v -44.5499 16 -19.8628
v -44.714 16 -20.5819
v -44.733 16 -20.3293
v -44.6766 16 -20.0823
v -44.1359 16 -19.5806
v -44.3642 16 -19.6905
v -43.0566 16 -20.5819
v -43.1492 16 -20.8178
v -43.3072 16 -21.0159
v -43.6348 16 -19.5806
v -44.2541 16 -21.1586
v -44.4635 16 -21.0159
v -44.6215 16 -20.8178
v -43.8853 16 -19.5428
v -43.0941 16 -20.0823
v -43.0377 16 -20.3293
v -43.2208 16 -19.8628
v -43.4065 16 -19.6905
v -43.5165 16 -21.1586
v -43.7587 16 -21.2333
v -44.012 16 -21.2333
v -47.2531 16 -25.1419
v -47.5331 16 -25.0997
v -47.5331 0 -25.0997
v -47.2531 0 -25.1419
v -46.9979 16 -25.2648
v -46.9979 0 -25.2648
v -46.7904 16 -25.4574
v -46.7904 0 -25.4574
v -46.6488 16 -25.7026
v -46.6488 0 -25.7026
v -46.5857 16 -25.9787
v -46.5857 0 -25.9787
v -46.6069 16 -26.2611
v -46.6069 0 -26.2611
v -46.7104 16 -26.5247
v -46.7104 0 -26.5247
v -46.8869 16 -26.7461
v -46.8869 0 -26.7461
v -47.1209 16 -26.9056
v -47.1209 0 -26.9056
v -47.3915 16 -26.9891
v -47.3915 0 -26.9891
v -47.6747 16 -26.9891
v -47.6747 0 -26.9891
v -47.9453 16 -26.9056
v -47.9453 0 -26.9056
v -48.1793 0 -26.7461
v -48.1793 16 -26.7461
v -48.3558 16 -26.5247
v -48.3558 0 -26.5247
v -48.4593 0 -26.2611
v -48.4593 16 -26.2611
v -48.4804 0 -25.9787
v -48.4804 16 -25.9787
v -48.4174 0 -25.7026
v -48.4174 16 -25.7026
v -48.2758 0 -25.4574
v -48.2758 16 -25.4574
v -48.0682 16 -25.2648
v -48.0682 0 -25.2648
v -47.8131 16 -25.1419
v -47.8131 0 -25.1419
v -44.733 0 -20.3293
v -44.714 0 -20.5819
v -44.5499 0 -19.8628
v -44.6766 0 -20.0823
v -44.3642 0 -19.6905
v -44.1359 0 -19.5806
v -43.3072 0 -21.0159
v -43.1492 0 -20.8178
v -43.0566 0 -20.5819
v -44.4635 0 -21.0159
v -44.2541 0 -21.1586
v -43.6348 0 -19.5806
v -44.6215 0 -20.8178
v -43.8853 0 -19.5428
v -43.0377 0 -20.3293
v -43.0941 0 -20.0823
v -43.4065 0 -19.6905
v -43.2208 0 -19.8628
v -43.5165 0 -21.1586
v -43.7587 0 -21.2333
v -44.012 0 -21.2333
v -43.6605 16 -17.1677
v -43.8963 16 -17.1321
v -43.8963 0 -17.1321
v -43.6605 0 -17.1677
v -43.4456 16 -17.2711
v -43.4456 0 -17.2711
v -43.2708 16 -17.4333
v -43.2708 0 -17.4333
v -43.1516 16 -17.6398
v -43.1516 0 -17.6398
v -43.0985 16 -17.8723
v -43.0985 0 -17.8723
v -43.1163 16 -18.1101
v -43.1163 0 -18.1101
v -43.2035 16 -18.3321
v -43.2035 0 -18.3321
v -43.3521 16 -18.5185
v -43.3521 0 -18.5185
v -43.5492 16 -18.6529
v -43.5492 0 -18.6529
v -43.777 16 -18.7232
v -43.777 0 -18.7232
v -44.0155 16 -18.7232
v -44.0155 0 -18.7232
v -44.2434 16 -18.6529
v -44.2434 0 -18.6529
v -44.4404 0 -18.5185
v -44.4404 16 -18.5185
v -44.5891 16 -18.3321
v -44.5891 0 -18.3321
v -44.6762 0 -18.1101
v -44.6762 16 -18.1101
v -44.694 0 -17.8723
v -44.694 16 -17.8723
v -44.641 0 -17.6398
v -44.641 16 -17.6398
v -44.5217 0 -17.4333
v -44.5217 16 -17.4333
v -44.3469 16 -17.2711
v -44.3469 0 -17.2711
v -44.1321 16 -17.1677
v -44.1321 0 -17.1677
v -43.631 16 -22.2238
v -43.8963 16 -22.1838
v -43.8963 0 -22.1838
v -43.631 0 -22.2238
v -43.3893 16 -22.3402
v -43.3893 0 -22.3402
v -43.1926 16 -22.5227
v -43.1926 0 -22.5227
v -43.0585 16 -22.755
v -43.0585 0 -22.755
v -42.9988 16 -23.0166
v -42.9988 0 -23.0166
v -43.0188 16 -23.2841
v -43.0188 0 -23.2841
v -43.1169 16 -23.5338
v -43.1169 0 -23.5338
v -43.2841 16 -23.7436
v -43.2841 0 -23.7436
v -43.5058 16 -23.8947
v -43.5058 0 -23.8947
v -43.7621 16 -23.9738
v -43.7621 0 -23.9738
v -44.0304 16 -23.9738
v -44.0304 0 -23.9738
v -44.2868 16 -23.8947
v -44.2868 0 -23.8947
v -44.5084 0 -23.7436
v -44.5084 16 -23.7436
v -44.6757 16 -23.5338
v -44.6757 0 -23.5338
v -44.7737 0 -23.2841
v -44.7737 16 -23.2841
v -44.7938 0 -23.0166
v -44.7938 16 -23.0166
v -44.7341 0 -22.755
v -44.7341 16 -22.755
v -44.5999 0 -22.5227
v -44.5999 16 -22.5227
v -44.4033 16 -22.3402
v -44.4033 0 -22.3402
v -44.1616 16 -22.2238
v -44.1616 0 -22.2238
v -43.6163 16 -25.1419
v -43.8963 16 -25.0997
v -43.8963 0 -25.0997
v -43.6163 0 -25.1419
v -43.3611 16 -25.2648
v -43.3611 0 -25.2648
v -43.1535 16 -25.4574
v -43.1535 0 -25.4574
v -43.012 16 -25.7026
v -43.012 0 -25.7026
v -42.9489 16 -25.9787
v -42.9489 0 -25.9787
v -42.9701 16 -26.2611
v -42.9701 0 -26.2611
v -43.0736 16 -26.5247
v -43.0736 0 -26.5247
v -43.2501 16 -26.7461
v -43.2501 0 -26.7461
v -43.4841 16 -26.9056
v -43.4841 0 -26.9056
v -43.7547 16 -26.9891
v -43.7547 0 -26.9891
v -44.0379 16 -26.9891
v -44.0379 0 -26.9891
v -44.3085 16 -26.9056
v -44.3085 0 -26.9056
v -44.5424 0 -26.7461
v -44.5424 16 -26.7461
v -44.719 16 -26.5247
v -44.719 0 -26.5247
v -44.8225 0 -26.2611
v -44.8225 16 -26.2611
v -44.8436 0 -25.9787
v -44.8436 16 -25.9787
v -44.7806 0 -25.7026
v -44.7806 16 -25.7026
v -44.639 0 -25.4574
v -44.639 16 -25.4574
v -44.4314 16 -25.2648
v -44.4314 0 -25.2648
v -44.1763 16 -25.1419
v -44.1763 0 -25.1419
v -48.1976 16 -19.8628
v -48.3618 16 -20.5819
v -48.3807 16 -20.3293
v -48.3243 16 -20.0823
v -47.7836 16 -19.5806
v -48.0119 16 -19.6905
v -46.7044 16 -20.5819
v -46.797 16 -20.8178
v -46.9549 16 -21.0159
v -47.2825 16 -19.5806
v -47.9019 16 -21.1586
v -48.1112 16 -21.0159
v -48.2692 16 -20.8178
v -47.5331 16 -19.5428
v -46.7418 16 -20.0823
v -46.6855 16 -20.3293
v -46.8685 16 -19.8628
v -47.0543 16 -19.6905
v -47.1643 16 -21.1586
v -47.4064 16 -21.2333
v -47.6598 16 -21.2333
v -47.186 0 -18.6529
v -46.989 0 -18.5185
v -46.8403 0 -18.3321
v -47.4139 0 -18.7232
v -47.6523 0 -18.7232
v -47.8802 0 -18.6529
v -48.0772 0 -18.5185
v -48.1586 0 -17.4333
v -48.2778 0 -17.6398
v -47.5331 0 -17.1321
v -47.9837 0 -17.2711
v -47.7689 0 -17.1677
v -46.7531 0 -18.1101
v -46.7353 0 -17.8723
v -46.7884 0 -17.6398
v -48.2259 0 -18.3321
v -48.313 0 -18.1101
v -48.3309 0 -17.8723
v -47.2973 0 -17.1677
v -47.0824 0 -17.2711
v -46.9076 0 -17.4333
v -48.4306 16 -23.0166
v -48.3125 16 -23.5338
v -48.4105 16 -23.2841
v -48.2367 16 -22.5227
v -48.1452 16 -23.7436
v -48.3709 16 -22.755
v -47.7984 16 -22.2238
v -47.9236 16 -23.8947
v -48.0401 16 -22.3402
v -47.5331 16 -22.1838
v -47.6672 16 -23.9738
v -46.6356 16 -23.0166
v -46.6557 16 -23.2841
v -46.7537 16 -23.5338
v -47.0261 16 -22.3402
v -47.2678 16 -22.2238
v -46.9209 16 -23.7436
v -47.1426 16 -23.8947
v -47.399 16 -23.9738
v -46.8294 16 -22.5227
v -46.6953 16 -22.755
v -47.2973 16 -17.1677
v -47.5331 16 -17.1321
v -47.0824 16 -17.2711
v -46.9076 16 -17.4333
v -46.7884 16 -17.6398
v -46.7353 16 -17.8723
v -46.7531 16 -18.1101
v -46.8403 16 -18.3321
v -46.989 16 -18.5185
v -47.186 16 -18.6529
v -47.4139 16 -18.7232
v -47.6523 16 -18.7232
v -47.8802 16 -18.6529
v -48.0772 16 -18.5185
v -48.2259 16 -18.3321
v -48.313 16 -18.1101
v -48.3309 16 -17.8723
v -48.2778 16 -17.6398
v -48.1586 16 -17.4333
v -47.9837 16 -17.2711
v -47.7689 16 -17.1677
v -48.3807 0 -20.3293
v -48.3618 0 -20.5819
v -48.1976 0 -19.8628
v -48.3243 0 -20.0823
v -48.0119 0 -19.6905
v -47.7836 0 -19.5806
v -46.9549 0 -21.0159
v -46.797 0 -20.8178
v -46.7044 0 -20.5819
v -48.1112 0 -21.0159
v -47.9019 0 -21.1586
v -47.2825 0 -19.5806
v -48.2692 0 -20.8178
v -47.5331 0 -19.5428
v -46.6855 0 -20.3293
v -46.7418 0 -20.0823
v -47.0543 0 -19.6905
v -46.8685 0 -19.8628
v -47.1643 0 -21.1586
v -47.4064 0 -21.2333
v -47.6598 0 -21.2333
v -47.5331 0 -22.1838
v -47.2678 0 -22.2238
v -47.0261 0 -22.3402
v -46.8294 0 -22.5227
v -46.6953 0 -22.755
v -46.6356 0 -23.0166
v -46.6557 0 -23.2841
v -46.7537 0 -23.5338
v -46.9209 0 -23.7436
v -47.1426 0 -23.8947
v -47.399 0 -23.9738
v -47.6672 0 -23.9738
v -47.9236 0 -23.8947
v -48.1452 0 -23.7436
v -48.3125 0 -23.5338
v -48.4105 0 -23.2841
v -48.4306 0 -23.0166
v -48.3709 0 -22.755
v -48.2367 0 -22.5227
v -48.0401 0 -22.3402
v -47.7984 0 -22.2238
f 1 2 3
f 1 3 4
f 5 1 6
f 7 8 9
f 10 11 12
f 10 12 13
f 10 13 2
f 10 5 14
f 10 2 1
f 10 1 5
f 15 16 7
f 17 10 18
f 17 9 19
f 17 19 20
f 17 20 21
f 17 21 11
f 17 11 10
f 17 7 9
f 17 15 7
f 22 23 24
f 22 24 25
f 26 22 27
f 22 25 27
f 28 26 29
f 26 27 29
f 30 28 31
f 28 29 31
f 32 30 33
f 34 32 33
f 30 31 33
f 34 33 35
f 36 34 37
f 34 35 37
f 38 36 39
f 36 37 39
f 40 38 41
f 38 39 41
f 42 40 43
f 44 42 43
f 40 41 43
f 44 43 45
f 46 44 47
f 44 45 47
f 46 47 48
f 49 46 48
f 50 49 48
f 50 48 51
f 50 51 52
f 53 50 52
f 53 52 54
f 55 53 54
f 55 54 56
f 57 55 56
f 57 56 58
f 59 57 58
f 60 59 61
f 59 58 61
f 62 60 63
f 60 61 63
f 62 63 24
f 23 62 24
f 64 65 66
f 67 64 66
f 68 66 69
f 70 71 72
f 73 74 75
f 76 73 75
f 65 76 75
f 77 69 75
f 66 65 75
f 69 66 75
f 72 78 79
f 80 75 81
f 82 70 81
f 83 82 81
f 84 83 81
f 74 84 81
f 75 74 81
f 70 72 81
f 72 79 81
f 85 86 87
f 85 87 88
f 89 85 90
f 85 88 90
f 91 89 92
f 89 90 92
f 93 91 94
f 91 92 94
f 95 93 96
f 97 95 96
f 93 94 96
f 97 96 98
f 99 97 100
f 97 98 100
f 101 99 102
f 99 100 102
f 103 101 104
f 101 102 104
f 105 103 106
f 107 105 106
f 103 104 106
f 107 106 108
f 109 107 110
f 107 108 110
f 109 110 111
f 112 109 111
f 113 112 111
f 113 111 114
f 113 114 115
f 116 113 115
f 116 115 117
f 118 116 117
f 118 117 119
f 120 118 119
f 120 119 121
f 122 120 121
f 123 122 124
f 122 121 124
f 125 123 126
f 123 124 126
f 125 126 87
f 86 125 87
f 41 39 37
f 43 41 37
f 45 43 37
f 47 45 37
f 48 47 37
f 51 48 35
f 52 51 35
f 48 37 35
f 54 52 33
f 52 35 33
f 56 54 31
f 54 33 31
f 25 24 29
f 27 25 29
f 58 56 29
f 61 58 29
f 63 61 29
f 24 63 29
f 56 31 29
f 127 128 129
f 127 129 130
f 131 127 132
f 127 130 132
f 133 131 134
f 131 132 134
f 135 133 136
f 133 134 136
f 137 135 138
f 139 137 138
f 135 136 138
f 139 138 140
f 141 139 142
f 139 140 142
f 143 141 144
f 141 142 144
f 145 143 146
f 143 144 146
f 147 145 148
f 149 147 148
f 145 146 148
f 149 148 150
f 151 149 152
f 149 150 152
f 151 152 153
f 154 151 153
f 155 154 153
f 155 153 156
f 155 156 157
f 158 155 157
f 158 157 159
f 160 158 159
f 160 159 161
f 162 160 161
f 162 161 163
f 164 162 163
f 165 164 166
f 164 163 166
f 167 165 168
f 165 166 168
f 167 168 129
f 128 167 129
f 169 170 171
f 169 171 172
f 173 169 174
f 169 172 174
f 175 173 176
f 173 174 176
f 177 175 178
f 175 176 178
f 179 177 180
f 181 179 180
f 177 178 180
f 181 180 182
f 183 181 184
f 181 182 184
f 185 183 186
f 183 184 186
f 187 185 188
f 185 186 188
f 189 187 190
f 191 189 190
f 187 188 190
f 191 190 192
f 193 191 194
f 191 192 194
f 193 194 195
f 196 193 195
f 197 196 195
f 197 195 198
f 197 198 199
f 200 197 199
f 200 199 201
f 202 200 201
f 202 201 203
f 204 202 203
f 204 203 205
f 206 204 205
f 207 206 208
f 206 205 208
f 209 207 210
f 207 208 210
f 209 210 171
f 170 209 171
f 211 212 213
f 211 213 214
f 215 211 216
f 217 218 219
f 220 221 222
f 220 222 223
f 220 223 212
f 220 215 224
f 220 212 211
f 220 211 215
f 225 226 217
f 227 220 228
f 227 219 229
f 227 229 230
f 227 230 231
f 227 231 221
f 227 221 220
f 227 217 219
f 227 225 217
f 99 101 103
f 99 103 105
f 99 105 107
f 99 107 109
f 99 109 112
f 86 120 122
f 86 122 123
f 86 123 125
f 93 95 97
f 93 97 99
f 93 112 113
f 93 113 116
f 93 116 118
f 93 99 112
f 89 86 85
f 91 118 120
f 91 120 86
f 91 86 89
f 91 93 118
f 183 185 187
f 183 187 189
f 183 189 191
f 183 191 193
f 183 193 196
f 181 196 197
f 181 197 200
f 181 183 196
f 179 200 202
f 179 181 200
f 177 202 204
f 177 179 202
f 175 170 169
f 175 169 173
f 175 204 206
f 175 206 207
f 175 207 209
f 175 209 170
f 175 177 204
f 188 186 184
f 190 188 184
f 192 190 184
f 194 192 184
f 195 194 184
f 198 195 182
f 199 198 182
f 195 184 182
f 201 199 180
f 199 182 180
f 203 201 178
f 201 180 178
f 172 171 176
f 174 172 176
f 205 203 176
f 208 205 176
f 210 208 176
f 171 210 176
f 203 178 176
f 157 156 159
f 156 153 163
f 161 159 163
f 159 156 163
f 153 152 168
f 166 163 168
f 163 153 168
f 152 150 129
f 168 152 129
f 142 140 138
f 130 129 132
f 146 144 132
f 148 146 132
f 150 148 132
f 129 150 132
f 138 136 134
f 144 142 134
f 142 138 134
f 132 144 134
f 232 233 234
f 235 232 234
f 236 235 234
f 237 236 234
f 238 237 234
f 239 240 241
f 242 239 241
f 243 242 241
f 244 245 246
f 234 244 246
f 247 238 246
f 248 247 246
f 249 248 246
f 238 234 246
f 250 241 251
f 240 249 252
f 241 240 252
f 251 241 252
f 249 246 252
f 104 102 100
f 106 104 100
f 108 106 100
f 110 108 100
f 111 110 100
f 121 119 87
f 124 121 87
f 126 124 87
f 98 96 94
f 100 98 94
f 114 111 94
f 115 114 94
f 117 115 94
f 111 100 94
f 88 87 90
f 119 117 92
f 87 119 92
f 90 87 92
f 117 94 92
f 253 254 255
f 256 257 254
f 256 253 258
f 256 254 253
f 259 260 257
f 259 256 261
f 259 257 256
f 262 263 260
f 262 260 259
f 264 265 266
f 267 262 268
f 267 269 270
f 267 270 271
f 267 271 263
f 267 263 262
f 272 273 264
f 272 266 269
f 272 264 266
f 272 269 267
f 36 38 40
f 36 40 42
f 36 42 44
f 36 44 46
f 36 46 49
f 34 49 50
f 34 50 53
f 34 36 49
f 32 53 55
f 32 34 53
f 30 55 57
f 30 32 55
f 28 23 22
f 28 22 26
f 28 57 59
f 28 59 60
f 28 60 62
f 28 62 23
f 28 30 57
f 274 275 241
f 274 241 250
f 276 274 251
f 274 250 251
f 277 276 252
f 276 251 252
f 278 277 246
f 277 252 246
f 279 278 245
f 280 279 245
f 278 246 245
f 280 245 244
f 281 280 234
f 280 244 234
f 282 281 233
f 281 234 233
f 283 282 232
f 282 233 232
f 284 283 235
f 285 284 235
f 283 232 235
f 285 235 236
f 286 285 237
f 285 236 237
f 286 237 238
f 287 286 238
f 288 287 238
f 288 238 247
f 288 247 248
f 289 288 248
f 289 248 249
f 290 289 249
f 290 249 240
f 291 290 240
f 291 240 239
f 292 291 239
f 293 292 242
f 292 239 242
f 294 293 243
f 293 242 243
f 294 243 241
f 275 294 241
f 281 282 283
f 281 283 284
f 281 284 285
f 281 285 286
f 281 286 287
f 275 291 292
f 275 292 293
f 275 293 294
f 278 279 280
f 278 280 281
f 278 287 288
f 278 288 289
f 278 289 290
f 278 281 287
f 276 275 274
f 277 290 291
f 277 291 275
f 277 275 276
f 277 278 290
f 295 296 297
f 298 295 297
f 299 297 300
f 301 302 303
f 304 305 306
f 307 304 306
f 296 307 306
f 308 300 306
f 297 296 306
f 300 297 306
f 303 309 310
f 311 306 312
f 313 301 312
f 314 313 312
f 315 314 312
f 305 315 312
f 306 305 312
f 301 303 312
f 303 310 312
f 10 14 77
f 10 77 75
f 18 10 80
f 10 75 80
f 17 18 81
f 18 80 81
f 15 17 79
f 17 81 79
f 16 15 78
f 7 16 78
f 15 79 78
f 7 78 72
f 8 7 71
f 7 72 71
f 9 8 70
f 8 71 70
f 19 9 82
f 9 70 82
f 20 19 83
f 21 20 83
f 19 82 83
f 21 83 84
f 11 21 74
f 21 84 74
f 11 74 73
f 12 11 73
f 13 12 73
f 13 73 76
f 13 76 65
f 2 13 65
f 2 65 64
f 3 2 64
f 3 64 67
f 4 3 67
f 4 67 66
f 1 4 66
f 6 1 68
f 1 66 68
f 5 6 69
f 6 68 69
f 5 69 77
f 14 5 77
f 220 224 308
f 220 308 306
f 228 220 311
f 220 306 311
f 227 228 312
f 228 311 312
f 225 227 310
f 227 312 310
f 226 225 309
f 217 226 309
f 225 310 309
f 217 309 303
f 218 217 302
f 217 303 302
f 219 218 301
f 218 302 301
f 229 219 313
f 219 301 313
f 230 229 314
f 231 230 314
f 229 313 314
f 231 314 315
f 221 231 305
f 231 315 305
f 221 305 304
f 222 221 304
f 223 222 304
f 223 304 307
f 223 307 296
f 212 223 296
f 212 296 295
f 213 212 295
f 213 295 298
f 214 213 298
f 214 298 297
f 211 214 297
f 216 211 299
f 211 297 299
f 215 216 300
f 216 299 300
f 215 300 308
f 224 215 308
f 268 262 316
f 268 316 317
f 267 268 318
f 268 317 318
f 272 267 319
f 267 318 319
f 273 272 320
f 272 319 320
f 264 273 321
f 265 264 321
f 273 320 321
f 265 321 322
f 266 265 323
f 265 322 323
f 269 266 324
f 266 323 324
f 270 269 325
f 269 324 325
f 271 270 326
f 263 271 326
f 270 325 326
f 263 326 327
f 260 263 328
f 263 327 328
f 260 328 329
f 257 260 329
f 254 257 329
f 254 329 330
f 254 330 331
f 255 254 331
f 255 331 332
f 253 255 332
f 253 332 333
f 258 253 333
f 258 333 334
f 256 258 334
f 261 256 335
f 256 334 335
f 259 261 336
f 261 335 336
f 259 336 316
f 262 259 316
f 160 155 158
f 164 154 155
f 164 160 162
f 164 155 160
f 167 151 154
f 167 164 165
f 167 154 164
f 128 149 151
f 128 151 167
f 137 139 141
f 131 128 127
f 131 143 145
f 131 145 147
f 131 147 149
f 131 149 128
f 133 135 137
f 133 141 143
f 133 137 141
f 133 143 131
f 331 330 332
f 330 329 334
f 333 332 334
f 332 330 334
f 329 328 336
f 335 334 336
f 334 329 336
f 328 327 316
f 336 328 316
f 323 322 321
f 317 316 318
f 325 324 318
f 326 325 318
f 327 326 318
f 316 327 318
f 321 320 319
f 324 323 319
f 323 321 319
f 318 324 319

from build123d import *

# Parameters (mm, degrees)
SKETCH2_R             = 0.9
BOSS_EXTRUDE1_DEPTH   = 16
BOSS_EXTRUDE1_2_DEPTH = 16
SKETCH2_R_2           = 0.85
BOSS_EXTRUDE1_3_DEPTH = 16
BOSS_EXTRUDE1_4_DEPTH = 16
SKETCH2_R_3           = 0.8
BOSS_EXTRUDE1_5_DEPTH = 16
BOSS_EXTRUDE1_6_DEPTH = 16
SKETCH2_R_4           = 0.95
BOSS_EXTRUDE1_7_DEPTH = 16
BOSS_EXTRUDE1_8_DEPTH = 16


with BuildPart() as part:
    # Sketch2 → Boss-Extrude1 (new body)
    with BuildSketch(Plane(origin=(0, 0, 0), x_dir=(1, 0, 0), z_dir=(0, 1, 0))):
        with Locations(Location((-47.533090066, 23.083829298, 0), (0, 0, 270))):
            Circle(SKETCH2_R)
    extrude(amount=BOSS_EXTRUDE1_DEPTH)


with BuildPart() as body_2:
    # Sketch2 → Boss-Extrude1 2 (new body)
    with BuildSketch(Plane(origin=(0, 0, 0), x_dir=(1, 0, 0), z_dir=(0, 1, 0))):
        with Locations(Location((-43.896280183, 23.083829298, 0), (0, 0, 270))):
            Circle(SKETCH2_R)
    extrude(amount=BOSS_EXTRUDE1_2_DEPTH)


with BuildPart() as body_3:
    # Sketch2 → Boss-Extrude1 3 (new body)
    with BuildSketch(Plane(origin=(0, 0, 0), x_dir=(1, 0, 0), z_dir=(0, 1, 0))):
        with Locations(Location((-47.533090066, 20.392803886, 0), (0, 0, 270))):
            Circle(SKETCH2_R_2)
    extrude(amount=BOSS_EXTRUDE1_3_DEPTH)


with BuildPart() as body_4:
    # Sketch2 → Boss-Extrude1 4 (new body)
    with BuildSketch(Plane(origin=(0, 0, 0), x_dir=(1, 0, 0), z_dir=(0, 1, 0))):
        with Locations(Location((-43.885336498, 20.392803886, 0), (0, 0, 270))):
            Circle(SKETCH2_R_2)
    extrude(amount=BOSS_EXTRUDE1_4_DEPTH)


with BuildPart() as body_5:
    # Sketch2 → Boss-Extrude1 5 (new body)
    with BuildSketch(Plane(origin=(0, 0, 0), x_dir=(1, 0, 0), z_dir=(0, 1, 0))):
        with Locations(Location((-47.533090066, 17.932108277, 0), (0, 0, 270))):
            Circle(SKETCH2_R_3)
    extrude(amount=BOSS_EXTRUDE1_5_DEPTH)


with BuildPart() as body_6:
    # Sketch2 → Boss-Extrude1 6 (new body)
    with BuildSketch(Plane(origin=(0, 0, 0), x_dir=(1, 0, 0), z_dir=(0, 1, 0))):
        with Locations(Location((-43.896280183, 17.932108277, 0), (0, 0, 270))):
            Circle(SKETCH2_R_3)
    extrude(amount=BOSS_EXTRUDE1_6_DEPTH)


with BuildPart() as body_7:
    # Sketch2 → Boss-Extrude1 7 (new body)
    with BuildSketch(Plane(origin=(0, 0, 0), x_dir=(1, 0, 0), z_dir=(0, 1, 0))):
        with Locations(Location((-47.533090066, 26.049720524, 0), (0, 0, 270))):
            Circle(SKETCH2_R_4)
    extrude(amount=BOSS_EXTRUDE1_7_DEPTH)


with BuildPart() as body_8:
    # Sketch2 → Boss-Extrude1 8 (new body)
    with BuildSketch(Plane(origin=(0, 0, 0), x_dir=(1, 0, 0), z_dir=(0, 1, 0))):
        with Locations(Location((-43.896280183, 26.049720524, 0), (0, 0, 270))):
            Circle(SKETCH2_R_4)
    extrude(amount=BOSS_EXTRUDE1_8_DEPTH)


solid = Compound([part.part, body_2.part, body_3.part, body_4.part, body_5.part, body_6.part, body_7.part, body_8.part])
